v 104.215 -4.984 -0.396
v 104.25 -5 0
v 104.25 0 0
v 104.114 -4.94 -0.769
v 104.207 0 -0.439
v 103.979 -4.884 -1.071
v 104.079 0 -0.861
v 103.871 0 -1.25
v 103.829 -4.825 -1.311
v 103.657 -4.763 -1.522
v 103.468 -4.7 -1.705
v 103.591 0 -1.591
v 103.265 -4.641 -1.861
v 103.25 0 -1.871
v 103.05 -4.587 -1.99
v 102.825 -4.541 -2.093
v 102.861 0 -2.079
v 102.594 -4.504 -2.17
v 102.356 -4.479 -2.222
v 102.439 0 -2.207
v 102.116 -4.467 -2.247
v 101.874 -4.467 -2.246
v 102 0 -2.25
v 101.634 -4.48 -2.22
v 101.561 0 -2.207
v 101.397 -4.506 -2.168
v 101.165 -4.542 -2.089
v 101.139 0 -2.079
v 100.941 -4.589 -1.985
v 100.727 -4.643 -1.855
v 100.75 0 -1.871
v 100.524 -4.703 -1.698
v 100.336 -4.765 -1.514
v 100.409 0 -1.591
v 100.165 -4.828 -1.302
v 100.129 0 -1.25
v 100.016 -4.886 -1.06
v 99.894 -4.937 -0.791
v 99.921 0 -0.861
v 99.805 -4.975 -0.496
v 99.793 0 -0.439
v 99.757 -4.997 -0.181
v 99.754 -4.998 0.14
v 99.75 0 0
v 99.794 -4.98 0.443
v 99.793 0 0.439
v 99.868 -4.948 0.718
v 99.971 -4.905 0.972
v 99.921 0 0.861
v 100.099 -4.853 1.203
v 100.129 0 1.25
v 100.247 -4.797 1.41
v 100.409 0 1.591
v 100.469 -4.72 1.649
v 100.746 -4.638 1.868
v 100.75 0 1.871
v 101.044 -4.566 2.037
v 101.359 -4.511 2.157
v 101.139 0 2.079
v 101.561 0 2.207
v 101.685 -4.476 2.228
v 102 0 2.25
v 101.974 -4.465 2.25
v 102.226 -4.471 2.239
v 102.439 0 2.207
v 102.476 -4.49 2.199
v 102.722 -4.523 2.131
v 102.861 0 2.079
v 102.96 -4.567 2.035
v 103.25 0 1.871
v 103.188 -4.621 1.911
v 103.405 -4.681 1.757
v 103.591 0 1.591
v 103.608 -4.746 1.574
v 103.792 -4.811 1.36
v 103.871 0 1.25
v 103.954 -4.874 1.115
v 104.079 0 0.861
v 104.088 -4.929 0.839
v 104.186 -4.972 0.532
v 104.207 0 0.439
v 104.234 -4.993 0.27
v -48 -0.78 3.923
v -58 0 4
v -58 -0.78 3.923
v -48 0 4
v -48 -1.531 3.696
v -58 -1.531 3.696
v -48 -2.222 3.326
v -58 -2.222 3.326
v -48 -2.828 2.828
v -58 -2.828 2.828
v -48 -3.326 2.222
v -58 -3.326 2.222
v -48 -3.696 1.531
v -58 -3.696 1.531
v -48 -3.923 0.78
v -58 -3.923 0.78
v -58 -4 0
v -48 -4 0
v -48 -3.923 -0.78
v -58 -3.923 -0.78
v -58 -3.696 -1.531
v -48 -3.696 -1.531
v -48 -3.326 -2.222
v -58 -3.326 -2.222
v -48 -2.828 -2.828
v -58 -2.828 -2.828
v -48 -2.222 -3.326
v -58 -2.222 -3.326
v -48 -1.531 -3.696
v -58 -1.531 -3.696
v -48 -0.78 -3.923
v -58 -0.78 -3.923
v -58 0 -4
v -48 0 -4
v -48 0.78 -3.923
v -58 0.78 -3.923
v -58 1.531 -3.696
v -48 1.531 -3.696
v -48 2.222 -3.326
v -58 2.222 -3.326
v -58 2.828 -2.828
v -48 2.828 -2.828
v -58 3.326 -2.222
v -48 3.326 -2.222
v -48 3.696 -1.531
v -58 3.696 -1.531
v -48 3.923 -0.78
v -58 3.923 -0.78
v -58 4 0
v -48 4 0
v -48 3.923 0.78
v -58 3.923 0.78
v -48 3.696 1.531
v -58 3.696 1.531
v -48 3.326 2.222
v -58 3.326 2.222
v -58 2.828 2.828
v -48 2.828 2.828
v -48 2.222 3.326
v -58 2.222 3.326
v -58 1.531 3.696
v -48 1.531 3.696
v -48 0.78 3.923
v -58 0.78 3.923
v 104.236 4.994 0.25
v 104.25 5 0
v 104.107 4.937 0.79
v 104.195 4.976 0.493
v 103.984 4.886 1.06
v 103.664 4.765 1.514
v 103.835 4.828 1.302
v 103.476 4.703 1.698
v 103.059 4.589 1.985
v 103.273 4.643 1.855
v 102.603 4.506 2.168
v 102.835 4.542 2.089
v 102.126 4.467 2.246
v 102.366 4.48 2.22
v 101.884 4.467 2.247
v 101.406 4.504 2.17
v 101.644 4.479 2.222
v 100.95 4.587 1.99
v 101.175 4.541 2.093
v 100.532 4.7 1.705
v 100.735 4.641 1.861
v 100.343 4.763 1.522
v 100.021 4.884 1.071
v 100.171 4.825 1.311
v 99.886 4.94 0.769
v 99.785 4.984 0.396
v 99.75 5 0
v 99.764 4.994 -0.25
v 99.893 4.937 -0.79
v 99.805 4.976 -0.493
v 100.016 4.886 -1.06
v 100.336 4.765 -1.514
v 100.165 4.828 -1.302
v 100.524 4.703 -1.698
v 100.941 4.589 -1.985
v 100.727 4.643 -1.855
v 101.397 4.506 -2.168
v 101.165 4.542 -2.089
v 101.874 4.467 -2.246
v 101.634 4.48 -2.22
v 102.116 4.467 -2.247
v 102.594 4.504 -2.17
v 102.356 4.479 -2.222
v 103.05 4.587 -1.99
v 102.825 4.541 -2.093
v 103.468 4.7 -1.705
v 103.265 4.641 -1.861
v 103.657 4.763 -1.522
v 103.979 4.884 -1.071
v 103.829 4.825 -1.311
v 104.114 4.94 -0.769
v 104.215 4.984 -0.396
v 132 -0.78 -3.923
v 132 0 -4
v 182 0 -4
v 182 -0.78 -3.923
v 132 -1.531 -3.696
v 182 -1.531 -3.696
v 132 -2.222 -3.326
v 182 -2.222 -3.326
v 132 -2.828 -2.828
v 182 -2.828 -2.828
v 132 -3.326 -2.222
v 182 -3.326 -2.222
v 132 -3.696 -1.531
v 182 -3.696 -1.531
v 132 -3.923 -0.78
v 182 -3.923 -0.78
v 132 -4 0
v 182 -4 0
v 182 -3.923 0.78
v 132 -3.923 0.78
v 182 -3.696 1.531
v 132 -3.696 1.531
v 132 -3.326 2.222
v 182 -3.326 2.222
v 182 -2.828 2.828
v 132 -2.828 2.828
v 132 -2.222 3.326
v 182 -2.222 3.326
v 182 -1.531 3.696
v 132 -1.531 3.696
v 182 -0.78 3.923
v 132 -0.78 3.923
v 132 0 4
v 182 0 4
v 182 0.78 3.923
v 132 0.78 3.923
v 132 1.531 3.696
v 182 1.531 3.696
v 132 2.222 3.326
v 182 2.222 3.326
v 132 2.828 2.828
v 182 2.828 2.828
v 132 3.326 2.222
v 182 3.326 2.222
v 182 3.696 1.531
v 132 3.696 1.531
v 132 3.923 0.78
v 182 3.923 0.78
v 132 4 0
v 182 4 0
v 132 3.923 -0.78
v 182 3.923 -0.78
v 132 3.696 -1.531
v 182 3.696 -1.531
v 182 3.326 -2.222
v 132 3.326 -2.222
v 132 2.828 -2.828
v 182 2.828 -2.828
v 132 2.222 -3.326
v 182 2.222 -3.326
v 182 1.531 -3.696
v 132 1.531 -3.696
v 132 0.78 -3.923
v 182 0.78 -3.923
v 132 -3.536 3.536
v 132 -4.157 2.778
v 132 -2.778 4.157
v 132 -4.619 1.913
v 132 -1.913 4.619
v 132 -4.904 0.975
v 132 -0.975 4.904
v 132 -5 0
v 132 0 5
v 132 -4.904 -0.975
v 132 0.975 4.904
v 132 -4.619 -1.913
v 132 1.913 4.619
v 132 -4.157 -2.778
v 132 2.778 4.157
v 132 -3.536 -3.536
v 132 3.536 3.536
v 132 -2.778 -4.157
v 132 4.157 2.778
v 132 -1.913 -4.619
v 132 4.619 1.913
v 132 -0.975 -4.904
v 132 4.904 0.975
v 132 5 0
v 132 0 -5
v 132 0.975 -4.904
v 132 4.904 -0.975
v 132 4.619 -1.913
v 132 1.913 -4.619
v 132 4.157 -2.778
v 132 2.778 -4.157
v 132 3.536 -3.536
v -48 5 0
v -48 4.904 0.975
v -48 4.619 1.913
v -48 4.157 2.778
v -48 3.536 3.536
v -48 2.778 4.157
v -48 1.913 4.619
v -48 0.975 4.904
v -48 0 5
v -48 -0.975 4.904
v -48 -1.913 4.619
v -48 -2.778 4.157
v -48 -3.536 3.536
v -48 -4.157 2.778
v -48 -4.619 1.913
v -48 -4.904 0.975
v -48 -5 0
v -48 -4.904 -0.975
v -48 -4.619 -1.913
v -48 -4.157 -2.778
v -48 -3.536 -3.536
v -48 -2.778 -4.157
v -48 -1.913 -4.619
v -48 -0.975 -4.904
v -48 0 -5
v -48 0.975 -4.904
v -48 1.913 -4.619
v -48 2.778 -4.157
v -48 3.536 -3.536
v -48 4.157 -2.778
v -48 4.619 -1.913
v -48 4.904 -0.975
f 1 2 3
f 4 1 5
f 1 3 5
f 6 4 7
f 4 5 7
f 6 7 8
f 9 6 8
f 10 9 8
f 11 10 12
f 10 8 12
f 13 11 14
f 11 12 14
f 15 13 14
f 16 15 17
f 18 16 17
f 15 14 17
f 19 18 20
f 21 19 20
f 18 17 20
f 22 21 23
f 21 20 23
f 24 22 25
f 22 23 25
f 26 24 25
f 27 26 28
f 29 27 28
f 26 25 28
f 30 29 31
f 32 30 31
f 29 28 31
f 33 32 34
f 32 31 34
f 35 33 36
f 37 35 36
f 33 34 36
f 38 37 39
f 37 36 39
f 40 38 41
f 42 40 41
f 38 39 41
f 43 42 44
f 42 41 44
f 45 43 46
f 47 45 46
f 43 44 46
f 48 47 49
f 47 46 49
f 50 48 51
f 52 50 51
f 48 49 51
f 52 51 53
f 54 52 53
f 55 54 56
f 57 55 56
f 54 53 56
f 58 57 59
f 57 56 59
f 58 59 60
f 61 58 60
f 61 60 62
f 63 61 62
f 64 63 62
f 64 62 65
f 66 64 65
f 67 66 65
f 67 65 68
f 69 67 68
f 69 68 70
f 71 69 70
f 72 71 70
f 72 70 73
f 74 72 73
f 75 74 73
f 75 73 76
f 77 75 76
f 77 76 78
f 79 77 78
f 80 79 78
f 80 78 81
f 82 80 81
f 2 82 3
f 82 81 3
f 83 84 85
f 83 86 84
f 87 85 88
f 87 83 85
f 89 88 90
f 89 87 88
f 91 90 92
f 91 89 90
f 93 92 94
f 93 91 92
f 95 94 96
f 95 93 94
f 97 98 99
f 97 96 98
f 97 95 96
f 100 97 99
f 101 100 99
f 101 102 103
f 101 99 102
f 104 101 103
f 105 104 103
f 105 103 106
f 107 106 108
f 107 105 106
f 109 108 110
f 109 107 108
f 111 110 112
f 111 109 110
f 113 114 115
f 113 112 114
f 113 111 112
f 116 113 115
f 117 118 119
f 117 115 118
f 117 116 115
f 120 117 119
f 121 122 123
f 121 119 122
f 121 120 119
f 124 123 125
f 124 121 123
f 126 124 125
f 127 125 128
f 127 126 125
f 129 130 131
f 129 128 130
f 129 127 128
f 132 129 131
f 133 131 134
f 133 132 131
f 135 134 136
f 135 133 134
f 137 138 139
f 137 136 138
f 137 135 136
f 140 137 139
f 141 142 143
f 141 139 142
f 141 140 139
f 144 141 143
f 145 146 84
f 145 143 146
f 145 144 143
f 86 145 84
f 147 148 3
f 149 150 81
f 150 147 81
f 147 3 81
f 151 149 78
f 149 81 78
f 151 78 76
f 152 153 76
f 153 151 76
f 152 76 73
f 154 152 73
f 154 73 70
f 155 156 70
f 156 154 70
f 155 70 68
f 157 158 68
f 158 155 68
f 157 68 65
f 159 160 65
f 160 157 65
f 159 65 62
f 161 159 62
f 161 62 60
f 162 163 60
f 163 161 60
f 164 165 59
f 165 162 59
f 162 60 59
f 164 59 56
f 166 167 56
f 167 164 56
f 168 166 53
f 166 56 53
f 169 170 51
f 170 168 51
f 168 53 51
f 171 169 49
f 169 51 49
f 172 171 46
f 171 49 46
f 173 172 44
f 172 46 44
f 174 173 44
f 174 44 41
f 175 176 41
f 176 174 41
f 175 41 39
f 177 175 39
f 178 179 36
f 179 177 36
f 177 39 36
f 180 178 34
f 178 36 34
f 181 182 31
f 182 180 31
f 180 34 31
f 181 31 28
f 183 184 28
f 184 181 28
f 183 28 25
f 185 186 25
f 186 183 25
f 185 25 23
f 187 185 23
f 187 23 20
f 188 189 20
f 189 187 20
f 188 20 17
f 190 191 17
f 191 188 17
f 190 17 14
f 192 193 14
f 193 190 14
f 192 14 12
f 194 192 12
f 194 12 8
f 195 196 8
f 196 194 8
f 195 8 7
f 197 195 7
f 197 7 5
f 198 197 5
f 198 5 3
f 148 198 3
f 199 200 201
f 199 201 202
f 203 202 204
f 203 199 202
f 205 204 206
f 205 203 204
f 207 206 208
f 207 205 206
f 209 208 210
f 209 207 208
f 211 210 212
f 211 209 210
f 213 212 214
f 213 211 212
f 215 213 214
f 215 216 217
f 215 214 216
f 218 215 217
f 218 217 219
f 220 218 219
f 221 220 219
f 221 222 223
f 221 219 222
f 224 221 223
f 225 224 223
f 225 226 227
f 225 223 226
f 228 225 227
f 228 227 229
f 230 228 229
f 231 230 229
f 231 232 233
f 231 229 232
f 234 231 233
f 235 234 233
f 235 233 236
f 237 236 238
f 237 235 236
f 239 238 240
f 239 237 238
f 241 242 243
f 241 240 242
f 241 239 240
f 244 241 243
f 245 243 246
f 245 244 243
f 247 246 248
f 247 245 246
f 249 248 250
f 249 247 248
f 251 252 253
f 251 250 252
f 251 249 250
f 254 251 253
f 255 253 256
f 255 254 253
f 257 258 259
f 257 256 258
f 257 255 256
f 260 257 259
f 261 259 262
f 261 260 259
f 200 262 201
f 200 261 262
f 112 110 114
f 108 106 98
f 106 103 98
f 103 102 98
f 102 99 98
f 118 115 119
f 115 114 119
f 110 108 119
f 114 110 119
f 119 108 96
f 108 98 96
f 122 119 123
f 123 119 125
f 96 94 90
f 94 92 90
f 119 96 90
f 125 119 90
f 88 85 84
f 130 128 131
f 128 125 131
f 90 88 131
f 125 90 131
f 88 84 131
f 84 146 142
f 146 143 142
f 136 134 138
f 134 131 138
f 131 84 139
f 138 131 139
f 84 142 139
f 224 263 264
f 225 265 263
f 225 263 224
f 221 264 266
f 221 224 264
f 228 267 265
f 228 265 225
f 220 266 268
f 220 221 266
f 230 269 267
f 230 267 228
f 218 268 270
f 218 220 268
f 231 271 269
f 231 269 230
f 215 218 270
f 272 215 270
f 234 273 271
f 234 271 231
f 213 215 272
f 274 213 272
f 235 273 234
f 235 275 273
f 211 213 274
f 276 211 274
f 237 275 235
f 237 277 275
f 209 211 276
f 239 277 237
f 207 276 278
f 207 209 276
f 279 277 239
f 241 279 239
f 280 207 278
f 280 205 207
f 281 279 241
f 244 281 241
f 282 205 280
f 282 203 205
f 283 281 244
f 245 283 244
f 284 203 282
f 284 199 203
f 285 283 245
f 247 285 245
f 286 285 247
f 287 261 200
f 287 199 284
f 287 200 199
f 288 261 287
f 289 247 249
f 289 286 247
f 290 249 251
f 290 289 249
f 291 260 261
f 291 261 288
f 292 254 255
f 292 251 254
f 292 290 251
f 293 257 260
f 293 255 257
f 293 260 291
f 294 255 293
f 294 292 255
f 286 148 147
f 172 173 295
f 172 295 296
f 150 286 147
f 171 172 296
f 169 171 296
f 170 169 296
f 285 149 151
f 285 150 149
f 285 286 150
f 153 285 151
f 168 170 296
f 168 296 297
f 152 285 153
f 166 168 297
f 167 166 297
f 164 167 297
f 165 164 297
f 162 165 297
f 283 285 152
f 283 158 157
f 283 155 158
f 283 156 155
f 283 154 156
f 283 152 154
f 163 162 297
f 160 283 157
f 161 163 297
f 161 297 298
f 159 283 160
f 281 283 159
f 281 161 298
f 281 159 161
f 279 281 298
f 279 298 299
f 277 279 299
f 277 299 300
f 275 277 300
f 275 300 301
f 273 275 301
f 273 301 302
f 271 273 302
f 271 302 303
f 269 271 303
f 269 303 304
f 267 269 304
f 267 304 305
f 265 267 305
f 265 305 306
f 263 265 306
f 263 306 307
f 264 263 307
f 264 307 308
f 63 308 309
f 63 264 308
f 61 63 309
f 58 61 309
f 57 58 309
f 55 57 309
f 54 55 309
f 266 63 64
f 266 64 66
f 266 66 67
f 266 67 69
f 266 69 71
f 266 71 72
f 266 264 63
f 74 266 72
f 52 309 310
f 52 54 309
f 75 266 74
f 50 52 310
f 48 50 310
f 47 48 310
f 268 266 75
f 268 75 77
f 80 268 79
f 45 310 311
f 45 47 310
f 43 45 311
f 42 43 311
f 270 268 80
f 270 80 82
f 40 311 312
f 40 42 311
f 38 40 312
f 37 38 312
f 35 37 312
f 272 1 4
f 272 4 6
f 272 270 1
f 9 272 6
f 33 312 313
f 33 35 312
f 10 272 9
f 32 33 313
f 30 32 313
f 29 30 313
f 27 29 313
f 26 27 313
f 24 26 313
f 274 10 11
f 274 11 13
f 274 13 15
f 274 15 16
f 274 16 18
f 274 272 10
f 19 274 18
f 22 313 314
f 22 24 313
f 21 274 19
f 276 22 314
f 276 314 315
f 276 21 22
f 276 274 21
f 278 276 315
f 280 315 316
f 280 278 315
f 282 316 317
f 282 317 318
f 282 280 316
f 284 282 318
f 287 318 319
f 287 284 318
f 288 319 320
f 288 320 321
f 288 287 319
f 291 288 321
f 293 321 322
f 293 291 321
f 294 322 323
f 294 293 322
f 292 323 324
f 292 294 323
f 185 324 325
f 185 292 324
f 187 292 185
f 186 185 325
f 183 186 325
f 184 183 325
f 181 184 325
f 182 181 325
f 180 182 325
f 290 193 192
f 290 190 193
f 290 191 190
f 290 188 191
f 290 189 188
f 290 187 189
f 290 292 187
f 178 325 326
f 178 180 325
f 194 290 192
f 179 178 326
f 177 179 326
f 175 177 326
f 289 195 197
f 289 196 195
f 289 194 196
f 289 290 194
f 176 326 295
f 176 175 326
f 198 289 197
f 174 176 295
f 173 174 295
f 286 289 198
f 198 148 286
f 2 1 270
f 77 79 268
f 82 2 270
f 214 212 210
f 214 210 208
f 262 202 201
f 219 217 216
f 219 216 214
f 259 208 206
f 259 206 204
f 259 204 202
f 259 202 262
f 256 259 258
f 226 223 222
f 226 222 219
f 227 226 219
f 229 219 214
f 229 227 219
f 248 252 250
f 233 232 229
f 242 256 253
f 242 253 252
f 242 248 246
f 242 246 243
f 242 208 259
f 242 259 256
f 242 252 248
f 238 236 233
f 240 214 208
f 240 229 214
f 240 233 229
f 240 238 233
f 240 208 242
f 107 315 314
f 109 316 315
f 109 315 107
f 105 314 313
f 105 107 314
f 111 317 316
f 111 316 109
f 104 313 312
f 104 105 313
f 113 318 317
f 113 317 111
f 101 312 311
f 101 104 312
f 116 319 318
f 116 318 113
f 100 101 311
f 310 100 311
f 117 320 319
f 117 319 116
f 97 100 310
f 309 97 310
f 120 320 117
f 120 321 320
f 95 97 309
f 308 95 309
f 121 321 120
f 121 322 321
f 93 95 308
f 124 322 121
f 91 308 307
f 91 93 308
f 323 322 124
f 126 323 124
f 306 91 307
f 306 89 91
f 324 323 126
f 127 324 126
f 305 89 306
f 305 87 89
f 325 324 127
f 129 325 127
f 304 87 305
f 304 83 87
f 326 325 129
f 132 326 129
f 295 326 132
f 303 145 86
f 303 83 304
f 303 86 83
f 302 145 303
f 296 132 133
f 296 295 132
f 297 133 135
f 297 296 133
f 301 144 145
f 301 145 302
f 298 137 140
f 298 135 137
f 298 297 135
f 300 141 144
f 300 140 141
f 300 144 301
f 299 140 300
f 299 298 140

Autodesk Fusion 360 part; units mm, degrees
sketch "Sketch1" plane through (0, 0, 0) normal (1, 0, 0) x (0, 1, 0)
  circle A0 centre (0, 0) radius 5
  dimension "d1" = 10
extrude "Extrude1" add sketch "Sketch1" along normal blind 130
sketch "Sketch2" plane through (130, 0, 0) normal (1, 0, 0) x (0, 0, -1)
  circle A0 centre (0, 0) radius 5
  circle A1 centre (0, 0) radius 4
  dimension "d4" = 8
extrude "Extrude2" cut sketch "Sketch2" against normal blind 50
sketch "Sketch3" plane through (0, 0, 0) normal (-1, 0, 0) x (0, 0, 1)
  circle A0 centre (0, 0) radius 5
  circle A1 centre (0, 0) radius 4
  dimension "d7" = 8
extrude "Extrude3" cut sketch "Sketch3" against normal blind 20
extrude "Extrude4" add 1 faces at (20, 4.6443, -0.348) along direction (-1, 0, 0) blind 5
extrude "Extrude5" cut 1 faces at (0, -0.5286, 1.4202) along direction (1, 0, 0) blind 5
extrude "Extrude6" add 1 faces at (80, 4.6443, 0.348) along direction (1, 0, 0) blind 52
extrude "Extrude7" add 1 faces at (130, -0.2204, 1.0288) along direction (1, 0, 0) blind 12
extrude "Extrude8" add 1 faces at (142, -0.2204, 1.0288) along direction (1, 0, 0) blind 40
sketch "Sketch4" plane through (0, 0, 0) normal (0, 1, 0) x (1, 0, 0)
sketch "Sketch5" plane through (0, 0, 0) normal (0, 1, 0) x (1, 0, 0)
sketch "Sketch6" plane through (0, 0, 0) normal (0, 1, 0) x (1, 0, 0)
  line L0 (132, 0) -> (107, 0)
  circle A0 centre (107, 0) radius 2.25
  dimension "d20" = 25
  dimension "d21" = 4.5
sketch "Sketch7" plane through (0, 0, 0) normal (0, 1, 0) x (1, 0, 0)
  line L0 (107, 0) -> (85, 0)
sketch "Sketch9" plane through (0, 0, 0) normal (0, 1, 0) x (1, 0, 0)
  circle A0 centre (102, 0) radius 2.25
  line L0 (132, -5) -> (132, 5)
  dimension "d32" = 4.5
  dimension "d33" = 30
extrude "Extrude13" cut sketch "Sketch9" along normal mid plane 20
sketch "Sketch10" plane through (0, 0, 0) normal (0, 1, 0) x (1, 0, 0)
extrude "Extrude14" add 1 faces at (5, -0.5286, 1.4202) along direction (-1, 0, 0) blind 63
extrude "Extrude15" add 1 faces at (15, 4.6443, -0.348) along direction (-1, 0, 0) blind 63
sketch "Sketch8" plane through (0, 0, 0) normal (0, 1, 0) x (1, 0, 0)
extrude "Extrude11" [suppressed]
extrude "Extrude12" [suppressed]
